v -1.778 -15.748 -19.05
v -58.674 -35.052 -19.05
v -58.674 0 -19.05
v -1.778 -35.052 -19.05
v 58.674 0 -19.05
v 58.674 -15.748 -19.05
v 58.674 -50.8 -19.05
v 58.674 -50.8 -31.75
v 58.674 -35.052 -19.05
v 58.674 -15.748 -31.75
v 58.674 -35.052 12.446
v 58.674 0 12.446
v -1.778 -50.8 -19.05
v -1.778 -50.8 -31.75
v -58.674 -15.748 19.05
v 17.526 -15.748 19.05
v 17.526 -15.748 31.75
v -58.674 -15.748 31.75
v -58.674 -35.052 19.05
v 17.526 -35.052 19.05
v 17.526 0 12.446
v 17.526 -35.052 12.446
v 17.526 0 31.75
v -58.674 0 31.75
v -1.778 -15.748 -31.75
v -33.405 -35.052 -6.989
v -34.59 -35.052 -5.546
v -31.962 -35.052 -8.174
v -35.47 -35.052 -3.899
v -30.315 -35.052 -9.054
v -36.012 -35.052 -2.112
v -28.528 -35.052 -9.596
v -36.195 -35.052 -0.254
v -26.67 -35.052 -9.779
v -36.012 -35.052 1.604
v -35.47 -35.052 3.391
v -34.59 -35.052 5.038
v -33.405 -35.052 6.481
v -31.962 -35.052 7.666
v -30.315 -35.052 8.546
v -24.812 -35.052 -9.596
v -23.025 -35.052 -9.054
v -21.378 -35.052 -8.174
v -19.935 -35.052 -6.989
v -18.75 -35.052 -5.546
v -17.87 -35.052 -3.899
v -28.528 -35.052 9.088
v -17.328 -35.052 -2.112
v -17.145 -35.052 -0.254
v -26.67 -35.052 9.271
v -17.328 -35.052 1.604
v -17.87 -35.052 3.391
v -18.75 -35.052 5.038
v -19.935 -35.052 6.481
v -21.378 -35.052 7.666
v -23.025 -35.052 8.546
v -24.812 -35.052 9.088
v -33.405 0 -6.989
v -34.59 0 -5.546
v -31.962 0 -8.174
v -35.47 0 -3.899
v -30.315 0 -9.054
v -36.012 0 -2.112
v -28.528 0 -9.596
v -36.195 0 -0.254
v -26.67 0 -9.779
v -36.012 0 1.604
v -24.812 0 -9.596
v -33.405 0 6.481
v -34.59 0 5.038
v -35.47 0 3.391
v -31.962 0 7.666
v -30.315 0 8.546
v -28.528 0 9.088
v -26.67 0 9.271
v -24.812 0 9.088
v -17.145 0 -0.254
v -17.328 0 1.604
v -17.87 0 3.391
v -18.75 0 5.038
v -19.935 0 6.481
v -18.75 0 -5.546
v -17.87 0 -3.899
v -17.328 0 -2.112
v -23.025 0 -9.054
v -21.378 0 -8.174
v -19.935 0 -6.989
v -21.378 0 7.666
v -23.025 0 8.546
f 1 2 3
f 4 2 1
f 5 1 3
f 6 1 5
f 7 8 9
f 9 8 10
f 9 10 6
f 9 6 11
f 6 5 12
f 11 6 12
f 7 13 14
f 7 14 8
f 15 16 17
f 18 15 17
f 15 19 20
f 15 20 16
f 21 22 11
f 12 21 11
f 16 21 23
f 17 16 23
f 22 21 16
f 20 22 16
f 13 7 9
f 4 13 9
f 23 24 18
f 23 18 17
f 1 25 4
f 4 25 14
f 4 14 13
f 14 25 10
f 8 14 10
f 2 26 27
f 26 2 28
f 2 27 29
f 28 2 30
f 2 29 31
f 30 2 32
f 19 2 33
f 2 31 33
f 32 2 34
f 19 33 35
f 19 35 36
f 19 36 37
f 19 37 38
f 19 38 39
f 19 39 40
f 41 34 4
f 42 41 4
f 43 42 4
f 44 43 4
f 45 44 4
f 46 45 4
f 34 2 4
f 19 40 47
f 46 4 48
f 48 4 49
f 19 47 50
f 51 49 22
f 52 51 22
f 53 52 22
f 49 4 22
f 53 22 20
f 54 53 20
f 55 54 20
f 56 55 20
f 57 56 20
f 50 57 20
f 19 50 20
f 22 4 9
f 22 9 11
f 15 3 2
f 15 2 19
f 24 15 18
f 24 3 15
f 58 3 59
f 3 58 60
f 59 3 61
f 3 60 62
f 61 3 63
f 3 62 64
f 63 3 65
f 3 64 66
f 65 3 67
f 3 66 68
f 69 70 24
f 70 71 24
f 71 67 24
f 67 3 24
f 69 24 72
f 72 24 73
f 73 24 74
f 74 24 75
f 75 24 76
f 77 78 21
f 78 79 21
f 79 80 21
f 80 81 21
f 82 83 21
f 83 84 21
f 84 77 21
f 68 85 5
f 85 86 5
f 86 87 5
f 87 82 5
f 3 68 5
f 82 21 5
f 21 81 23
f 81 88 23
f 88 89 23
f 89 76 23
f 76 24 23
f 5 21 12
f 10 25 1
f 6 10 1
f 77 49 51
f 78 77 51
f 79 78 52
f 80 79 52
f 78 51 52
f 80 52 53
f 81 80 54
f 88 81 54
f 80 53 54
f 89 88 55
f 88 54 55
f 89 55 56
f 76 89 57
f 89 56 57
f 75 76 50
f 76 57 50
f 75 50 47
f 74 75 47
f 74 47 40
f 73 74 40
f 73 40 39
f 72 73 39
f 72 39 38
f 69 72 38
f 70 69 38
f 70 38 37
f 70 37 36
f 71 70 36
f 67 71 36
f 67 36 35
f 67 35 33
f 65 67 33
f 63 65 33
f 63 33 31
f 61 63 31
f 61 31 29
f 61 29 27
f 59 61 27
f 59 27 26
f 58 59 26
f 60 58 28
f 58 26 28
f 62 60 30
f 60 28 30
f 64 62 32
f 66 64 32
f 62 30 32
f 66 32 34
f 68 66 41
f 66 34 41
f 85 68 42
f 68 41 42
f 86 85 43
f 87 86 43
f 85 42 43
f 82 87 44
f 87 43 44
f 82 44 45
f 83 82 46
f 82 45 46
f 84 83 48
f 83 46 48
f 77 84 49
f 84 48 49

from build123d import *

# Parameters (mm, degrees)
F0_W      = 117.348
F0_H      = 63.5
F1_DEPTH  = 50.8
F2_W      = 41.148
F2_H      = 19.304
F3_DEPTH  = 50.801
F4_W      = 56.896
F4_H      = 12.7
F5_DEPTH  = 50.801
F6_R      = 9.525
F7_DEPTH  = 50.801
F8_W      = 15.748
F8_H      = 12.7
F9_DEPTH  = 117.349
F10_W     = 35.052
F10_H     = 12.7
F11_DEPTH = 76.201
F12_W     = 15.748
F12_H     = 38.1
F13_DEPTH = 76.201
F14_W     = 15.748
F14_H     = 31.496
F15_DEPTH = 117.349


with BuildPart() as f1:
    # F0 (on Front) → F1 (new body)
    with BuildSketch(Plane.XZ):
        Rectangle(F0_W, F0_H)
    extrude(amount=F1_DEPTH)

    # F2 (on face) → F3 (cut, through all)
    with BuildSketch(Plane.XZ.offset(50.8)):
        with Locations((38.1, 22.098)):
            Rectangle(F2_W, F2_H)
    extrude(amount=-F3_DEPTH, mode=Mode.SUBTRACT)

    # F4 (on face) → F5 (cut, through all)
    with BuildSketch(Plane.XZ.offset(50.8)):
        with Locations((-30.226, -25.4)):
            Rectangle(F4_W, F4_H)
    extrude(amount=-F5_DEPTH, mode=Mode.SUBTRACT)

    # F6 (on face) → F7 (cut, through all)
    with BuildSketch(Plane.XZ.offset(50.8)):
        with Locations((-26.67, -0.254)):
            Circle(F6_R)
    extrude(amount=-F7_DEPTH, mode=Mode.SUBTRACT)

    # F8 (on face) → F9 (cut, through all)
    with BuildSketch(Plane.YZ.offset(58.674)):
        with Locations((-7.874, -25.4)):
            Rectangle(F8_W, F8_H)
    extrude(amount=-F9_DEPTH, mode=Mode.SUBTRACT)

    # F10 (on face) → F11 (cut, through all)
    with BuildSketch(Plane.YZ.offset(17.526)):
        with Locations((-33.274, 25.4)):
            Rectangle(F10_W, F10_H)
    extrude(amount=-F11_DEPTH, mode=Mode.SUBTRACT)

    # F12 (on face) → F13 (cut, through all)
    with BuildSketch(Plane.YZ.offset(17.526)):
        with Locations((-42.926, 0)):
            Rectangle(F12_W, F12_H)
    extrude(amount=-F13_DEPTH, mode=Mode.SUBTRACT)

    # F14 (on face) → F15 (cut, through all)
    with BuildSketch(Plane.YZ.offset(58.674)):
        with Locations((-42.926, -3.302)):
            Rectangle(F14_W, F14_H)
    extrude(amount=-F15_DEPTH, mode=Mode.SUBTRACT)


solid = f1.part
